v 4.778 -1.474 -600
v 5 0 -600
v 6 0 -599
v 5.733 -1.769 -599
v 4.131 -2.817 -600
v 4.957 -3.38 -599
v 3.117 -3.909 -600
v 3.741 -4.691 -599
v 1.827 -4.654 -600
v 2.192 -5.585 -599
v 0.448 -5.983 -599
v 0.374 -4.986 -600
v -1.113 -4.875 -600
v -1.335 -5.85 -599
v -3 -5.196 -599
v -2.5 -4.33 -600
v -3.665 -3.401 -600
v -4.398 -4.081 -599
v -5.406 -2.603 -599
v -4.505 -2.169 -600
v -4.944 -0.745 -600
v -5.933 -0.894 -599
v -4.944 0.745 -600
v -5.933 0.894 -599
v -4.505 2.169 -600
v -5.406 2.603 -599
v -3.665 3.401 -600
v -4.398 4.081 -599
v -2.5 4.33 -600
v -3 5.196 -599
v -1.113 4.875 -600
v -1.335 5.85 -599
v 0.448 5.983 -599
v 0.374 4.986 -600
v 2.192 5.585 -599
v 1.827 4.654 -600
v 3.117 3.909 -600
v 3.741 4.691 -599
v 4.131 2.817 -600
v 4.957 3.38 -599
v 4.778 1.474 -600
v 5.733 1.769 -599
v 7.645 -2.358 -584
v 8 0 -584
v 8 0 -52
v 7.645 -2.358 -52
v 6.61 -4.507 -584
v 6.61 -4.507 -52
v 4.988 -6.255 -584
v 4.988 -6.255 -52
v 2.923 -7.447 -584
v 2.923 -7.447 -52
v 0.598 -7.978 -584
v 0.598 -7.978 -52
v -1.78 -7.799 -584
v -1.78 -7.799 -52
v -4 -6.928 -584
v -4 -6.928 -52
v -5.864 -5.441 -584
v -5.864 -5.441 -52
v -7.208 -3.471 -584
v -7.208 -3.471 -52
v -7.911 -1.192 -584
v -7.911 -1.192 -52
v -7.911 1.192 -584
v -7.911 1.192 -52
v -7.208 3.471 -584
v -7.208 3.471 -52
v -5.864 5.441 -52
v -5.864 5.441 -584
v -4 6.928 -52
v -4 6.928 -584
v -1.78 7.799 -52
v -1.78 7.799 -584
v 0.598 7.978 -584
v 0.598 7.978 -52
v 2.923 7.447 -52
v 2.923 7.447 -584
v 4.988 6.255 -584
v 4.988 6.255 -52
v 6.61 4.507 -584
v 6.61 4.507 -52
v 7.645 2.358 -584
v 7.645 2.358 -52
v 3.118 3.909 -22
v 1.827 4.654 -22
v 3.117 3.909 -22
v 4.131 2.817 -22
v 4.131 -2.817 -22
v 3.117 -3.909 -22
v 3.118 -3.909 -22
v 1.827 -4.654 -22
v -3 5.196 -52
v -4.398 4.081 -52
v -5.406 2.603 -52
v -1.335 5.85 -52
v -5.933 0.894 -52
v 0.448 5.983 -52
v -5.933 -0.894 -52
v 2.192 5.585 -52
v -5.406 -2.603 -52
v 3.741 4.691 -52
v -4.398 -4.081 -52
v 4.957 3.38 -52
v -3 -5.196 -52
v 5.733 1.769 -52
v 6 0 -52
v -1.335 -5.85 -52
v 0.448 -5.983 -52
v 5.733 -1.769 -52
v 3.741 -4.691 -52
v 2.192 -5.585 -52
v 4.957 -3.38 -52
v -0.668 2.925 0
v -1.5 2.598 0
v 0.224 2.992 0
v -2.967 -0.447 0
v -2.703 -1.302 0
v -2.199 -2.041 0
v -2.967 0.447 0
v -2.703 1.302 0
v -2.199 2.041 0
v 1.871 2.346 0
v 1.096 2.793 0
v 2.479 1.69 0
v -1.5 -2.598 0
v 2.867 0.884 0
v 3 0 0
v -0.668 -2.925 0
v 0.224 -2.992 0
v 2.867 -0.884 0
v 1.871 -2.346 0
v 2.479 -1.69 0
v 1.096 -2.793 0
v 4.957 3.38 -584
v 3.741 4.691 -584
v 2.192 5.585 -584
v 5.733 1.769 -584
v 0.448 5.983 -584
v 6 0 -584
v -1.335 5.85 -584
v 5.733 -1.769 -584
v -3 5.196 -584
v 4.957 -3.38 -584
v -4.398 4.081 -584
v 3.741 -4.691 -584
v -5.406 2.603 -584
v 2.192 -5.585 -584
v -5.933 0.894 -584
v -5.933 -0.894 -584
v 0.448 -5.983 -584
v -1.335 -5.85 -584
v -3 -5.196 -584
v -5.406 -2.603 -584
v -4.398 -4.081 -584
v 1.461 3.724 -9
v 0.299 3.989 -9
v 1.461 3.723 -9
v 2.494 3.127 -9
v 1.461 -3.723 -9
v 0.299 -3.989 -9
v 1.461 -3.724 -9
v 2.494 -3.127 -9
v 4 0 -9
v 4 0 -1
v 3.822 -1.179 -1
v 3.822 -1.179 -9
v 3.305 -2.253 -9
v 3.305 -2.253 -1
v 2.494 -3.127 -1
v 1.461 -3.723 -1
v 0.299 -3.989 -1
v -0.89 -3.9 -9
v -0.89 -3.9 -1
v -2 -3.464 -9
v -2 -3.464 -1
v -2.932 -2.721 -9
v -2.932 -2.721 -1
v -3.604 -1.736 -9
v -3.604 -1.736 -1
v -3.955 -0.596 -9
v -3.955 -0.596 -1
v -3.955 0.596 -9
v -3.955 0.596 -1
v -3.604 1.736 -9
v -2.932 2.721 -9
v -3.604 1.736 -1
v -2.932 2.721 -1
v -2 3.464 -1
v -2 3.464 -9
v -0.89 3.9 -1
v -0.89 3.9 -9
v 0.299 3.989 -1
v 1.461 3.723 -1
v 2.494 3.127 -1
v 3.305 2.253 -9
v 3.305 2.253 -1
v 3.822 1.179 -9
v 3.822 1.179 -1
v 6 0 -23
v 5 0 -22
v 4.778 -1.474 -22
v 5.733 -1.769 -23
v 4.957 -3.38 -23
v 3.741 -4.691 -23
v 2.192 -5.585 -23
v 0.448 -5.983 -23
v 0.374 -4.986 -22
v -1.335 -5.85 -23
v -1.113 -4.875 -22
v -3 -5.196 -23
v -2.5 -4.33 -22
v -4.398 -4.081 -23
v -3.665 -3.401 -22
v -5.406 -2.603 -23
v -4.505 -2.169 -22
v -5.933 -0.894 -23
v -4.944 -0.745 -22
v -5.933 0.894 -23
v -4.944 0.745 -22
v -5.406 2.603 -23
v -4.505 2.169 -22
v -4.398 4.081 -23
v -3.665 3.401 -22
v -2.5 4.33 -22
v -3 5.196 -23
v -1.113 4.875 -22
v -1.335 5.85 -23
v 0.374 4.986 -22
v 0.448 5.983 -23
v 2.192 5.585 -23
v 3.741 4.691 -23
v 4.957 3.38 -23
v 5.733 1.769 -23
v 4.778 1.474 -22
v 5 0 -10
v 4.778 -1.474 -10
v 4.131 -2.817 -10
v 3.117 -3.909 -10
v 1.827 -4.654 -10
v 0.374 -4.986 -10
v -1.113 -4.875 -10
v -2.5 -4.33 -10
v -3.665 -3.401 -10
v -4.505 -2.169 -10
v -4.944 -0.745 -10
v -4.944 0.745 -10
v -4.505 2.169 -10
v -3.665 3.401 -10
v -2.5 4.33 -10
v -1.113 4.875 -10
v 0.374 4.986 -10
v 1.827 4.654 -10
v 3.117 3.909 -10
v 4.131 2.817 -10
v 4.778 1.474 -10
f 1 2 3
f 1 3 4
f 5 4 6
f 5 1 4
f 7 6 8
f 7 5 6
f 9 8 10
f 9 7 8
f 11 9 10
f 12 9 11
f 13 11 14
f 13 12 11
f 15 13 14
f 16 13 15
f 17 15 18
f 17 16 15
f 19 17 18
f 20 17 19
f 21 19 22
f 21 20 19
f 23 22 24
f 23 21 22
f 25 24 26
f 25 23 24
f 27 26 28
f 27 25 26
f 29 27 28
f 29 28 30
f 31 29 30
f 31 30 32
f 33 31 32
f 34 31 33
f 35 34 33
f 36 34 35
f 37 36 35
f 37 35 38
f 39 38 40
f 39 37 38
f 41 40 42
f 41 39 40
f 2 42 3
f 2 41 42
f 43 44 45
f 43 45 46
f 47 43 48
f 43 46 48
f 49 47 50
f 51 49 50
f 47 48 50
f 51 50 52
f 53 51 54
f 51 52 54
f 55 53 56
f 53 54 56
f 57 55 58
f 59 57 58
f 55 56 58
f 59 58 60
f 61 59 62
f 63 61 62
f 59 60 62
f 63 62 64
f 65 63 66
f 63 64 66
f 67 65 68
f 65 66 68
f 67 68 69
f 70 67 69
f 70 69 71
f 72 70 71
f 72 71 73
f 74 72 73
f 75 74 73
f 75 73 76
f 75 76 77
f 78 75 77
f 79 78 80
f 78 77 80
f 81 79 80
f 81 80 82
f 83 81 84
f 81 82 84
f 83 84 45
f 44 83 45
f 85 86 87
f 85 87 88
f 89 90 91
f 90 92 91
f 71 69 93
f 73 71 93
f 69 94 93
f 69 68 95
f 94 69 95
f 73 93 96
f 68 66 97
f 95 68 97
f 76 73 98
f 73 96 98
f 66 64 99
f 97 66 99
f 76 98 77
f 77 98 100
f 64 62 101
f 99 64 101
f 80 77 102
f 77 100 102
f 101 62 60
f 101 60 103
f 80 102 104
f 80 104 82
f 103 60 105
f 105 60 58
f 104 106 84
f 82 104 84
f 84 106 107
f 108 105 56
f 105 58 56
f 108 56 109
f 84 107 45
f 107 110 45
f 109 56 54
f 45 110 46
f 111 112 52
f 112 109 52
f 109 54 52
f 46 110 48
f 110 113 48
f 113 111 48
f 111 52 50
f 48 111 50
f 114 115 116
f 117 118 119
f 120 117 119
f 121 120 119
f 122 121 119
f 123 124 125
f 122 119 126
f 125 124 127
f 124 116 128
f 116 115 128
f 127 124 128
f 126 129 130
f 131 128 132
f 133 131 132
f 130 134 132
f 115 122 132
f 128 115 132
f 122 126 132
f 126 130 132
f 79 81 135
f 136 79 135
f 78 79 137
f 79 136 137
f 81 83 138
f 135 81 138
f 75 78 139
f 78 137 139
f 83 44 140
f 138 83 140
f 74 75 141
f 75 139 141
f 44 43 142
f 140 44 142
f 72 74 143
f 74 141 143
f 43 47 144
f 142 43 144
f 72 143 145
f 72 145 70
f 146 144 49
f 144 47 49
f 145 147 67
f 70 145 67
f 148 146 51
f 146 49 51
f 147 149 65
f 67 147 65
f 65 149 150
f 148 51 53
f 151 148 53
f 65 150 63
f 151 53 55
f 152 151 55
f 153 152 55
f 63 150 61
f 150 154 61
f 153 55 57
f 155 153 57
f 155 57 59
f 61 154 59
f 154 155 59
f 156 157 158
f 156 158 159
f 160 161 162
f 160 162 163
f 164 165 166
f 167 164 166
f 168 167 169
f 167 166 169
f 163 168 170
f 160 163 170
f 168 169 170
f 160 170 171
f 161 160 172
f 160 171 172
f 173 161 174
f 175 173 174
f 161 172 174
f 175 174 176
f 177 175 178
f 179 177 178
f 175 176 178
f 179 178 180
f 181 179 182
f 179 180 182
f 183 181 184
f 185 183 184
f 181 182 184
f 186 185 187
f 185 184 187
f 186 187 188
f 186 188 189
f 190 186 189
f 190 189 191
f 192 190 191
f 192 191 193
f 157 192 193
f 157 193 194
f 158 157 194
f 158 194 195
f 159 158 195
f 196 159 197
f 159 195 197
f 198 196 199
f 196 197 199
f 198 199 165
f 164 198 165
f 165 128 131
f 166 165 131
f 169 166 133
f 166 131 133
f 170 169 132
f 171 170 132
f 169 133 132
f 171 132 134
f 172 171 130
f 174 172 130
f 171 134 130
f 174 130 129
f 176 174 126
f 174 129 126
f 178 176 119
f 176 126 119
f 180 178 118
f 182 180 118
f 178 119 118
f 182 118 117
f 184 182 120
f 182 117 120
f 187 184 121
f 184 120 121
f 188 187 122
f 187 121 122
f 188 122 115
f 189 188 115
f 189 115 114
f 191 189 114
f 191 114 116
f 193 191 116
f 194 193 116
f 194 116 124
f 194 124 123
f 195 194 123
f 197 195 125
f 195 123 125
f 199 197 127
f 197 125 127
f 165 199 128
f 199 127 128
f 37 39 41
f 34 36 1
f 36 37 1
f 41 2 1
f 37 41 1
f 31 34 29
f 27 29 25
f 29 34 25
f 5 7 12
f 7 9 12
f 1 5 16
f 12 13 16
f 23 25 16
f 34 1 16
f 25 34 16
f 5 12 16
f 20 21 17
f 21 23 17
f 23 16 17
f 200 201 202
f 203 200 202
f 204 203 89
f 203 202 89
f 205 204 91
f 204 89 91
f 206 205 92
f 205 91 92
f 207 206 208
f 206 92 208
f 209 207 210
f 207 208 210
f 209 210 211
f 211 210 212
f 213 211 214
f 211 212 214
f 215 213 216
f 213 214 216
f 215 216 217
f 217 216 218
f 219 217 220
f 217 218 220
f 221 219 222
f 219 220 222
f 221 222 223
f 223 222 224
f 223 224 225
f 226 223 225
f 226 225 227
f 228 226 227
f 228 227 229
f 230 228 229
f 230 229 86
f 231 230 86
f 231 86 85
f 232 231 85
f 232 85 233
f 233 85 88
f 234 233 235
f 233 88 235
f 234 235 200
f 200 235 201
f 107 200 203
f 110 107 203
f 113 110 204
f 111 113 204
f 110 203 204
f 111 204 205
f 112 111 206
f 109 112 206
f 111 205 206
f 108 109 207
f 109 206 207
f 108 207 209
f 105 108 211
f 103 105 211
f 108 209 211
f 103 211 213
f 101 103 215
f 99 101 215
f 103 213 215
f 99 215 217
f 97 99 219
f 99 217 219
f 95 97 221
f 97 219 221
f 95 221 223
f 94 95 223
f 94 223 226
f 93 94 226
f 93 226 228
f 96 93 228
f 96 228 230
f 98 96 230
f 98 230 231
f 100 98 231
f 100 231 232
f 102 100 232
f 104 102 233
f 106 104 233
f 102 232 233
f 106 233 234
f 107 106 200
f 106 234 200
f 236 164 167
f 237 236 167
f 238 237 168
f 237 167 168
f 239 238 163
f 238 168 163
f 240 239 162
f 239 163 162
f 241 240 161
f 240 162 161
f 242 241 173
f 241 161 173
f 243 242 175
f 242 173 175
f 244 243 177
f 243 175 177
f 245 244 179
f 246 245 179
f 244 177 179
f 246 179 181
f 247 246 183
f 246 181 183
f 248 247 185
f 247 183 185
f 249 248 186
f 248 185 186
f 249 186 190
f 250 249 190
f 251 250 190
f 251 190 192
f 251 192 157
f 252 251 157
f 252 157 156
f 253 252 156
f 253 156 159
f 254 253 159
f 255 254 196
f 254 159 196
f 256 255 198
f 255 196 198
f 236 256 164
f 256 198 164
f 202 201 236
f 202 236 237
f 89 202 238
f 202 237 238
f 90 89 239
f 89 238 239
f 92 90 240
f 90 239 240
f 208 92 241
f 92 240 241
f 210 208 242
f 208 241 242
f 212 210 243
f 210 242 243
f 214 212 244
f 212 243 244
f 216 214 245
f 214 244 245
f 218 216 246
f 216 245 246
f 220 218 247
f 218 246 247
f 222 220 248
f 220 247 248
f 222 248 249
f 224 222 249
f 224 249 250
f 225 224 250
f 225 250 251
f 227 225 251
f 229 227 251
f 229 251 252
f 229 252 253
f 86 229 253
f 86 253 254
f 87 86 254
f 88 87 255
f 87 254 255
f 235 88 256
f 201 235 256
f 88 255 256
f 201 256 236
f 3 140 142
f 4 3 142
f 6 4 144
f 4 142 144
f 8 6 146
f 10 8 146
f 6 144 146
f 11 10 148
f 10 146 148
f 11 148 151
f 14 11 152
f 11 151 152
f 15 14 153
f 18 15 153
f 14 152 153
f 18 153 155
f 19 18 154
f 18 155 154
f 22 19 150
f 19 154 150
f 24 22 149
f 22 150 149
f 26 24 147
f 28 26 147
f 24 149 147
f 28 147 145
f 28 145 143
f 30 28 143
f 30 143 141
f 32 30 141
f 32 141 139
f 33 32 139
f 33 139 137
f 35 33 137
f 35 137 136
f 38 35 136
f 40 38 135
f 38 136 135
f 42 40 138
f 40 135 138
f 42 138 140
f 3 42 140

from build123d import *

# Parameters (mm, degrees)
SFAZOWANIE1_SIZE = 1
SFAZOWANIE2_SIZE = 1


with BuildPart() as part:
    # Szkic1 → Obrót1 (revolve)
    with BuildSketch(Plane(origin=(0, 0, 0), x_dir=(0, 0, -1), z_dir=(1, 0, 0)), mode=Mode.PRIVATE) as obr_t1_sk:
        Polygon((0, 0), (600, 0), (600, 6), (584, 6), (584, 8), (52, 8), (52, 6), (22, 6), (22, 5), (9, 5), (9, 4), (0, 4), align=None)
    revolve(obr_t1_sk.sketch.rotate(Axis((0, 0, 0), (0, 0, -1)), 90), axis=Axis((0, 0, 0), (0, 0, -1)))

    # Sfazowanie1
    sfazowanie1_edges = [part.edges().sort_by_distance(p)[0] for p in [
        (-6, 0, -22),
        (-4, 0, 0),
        (-5, 0, -9),
    ]]
    chamfer(sfazowanie1_edges, length=SFAZOWANIE1_SIZE - 0.0001)  # a hair under: the kernel refuses the full size

    # Sfazowanie2
    sfazowanie2_edges = [part.edges().sort_by_distance(p)[0] for p in [
        (-6, 0, -600),
    ]]
    chamfer(sfazowanie2_edges, length=SFAZOWANIE2_SIZE)


solid = part.part
